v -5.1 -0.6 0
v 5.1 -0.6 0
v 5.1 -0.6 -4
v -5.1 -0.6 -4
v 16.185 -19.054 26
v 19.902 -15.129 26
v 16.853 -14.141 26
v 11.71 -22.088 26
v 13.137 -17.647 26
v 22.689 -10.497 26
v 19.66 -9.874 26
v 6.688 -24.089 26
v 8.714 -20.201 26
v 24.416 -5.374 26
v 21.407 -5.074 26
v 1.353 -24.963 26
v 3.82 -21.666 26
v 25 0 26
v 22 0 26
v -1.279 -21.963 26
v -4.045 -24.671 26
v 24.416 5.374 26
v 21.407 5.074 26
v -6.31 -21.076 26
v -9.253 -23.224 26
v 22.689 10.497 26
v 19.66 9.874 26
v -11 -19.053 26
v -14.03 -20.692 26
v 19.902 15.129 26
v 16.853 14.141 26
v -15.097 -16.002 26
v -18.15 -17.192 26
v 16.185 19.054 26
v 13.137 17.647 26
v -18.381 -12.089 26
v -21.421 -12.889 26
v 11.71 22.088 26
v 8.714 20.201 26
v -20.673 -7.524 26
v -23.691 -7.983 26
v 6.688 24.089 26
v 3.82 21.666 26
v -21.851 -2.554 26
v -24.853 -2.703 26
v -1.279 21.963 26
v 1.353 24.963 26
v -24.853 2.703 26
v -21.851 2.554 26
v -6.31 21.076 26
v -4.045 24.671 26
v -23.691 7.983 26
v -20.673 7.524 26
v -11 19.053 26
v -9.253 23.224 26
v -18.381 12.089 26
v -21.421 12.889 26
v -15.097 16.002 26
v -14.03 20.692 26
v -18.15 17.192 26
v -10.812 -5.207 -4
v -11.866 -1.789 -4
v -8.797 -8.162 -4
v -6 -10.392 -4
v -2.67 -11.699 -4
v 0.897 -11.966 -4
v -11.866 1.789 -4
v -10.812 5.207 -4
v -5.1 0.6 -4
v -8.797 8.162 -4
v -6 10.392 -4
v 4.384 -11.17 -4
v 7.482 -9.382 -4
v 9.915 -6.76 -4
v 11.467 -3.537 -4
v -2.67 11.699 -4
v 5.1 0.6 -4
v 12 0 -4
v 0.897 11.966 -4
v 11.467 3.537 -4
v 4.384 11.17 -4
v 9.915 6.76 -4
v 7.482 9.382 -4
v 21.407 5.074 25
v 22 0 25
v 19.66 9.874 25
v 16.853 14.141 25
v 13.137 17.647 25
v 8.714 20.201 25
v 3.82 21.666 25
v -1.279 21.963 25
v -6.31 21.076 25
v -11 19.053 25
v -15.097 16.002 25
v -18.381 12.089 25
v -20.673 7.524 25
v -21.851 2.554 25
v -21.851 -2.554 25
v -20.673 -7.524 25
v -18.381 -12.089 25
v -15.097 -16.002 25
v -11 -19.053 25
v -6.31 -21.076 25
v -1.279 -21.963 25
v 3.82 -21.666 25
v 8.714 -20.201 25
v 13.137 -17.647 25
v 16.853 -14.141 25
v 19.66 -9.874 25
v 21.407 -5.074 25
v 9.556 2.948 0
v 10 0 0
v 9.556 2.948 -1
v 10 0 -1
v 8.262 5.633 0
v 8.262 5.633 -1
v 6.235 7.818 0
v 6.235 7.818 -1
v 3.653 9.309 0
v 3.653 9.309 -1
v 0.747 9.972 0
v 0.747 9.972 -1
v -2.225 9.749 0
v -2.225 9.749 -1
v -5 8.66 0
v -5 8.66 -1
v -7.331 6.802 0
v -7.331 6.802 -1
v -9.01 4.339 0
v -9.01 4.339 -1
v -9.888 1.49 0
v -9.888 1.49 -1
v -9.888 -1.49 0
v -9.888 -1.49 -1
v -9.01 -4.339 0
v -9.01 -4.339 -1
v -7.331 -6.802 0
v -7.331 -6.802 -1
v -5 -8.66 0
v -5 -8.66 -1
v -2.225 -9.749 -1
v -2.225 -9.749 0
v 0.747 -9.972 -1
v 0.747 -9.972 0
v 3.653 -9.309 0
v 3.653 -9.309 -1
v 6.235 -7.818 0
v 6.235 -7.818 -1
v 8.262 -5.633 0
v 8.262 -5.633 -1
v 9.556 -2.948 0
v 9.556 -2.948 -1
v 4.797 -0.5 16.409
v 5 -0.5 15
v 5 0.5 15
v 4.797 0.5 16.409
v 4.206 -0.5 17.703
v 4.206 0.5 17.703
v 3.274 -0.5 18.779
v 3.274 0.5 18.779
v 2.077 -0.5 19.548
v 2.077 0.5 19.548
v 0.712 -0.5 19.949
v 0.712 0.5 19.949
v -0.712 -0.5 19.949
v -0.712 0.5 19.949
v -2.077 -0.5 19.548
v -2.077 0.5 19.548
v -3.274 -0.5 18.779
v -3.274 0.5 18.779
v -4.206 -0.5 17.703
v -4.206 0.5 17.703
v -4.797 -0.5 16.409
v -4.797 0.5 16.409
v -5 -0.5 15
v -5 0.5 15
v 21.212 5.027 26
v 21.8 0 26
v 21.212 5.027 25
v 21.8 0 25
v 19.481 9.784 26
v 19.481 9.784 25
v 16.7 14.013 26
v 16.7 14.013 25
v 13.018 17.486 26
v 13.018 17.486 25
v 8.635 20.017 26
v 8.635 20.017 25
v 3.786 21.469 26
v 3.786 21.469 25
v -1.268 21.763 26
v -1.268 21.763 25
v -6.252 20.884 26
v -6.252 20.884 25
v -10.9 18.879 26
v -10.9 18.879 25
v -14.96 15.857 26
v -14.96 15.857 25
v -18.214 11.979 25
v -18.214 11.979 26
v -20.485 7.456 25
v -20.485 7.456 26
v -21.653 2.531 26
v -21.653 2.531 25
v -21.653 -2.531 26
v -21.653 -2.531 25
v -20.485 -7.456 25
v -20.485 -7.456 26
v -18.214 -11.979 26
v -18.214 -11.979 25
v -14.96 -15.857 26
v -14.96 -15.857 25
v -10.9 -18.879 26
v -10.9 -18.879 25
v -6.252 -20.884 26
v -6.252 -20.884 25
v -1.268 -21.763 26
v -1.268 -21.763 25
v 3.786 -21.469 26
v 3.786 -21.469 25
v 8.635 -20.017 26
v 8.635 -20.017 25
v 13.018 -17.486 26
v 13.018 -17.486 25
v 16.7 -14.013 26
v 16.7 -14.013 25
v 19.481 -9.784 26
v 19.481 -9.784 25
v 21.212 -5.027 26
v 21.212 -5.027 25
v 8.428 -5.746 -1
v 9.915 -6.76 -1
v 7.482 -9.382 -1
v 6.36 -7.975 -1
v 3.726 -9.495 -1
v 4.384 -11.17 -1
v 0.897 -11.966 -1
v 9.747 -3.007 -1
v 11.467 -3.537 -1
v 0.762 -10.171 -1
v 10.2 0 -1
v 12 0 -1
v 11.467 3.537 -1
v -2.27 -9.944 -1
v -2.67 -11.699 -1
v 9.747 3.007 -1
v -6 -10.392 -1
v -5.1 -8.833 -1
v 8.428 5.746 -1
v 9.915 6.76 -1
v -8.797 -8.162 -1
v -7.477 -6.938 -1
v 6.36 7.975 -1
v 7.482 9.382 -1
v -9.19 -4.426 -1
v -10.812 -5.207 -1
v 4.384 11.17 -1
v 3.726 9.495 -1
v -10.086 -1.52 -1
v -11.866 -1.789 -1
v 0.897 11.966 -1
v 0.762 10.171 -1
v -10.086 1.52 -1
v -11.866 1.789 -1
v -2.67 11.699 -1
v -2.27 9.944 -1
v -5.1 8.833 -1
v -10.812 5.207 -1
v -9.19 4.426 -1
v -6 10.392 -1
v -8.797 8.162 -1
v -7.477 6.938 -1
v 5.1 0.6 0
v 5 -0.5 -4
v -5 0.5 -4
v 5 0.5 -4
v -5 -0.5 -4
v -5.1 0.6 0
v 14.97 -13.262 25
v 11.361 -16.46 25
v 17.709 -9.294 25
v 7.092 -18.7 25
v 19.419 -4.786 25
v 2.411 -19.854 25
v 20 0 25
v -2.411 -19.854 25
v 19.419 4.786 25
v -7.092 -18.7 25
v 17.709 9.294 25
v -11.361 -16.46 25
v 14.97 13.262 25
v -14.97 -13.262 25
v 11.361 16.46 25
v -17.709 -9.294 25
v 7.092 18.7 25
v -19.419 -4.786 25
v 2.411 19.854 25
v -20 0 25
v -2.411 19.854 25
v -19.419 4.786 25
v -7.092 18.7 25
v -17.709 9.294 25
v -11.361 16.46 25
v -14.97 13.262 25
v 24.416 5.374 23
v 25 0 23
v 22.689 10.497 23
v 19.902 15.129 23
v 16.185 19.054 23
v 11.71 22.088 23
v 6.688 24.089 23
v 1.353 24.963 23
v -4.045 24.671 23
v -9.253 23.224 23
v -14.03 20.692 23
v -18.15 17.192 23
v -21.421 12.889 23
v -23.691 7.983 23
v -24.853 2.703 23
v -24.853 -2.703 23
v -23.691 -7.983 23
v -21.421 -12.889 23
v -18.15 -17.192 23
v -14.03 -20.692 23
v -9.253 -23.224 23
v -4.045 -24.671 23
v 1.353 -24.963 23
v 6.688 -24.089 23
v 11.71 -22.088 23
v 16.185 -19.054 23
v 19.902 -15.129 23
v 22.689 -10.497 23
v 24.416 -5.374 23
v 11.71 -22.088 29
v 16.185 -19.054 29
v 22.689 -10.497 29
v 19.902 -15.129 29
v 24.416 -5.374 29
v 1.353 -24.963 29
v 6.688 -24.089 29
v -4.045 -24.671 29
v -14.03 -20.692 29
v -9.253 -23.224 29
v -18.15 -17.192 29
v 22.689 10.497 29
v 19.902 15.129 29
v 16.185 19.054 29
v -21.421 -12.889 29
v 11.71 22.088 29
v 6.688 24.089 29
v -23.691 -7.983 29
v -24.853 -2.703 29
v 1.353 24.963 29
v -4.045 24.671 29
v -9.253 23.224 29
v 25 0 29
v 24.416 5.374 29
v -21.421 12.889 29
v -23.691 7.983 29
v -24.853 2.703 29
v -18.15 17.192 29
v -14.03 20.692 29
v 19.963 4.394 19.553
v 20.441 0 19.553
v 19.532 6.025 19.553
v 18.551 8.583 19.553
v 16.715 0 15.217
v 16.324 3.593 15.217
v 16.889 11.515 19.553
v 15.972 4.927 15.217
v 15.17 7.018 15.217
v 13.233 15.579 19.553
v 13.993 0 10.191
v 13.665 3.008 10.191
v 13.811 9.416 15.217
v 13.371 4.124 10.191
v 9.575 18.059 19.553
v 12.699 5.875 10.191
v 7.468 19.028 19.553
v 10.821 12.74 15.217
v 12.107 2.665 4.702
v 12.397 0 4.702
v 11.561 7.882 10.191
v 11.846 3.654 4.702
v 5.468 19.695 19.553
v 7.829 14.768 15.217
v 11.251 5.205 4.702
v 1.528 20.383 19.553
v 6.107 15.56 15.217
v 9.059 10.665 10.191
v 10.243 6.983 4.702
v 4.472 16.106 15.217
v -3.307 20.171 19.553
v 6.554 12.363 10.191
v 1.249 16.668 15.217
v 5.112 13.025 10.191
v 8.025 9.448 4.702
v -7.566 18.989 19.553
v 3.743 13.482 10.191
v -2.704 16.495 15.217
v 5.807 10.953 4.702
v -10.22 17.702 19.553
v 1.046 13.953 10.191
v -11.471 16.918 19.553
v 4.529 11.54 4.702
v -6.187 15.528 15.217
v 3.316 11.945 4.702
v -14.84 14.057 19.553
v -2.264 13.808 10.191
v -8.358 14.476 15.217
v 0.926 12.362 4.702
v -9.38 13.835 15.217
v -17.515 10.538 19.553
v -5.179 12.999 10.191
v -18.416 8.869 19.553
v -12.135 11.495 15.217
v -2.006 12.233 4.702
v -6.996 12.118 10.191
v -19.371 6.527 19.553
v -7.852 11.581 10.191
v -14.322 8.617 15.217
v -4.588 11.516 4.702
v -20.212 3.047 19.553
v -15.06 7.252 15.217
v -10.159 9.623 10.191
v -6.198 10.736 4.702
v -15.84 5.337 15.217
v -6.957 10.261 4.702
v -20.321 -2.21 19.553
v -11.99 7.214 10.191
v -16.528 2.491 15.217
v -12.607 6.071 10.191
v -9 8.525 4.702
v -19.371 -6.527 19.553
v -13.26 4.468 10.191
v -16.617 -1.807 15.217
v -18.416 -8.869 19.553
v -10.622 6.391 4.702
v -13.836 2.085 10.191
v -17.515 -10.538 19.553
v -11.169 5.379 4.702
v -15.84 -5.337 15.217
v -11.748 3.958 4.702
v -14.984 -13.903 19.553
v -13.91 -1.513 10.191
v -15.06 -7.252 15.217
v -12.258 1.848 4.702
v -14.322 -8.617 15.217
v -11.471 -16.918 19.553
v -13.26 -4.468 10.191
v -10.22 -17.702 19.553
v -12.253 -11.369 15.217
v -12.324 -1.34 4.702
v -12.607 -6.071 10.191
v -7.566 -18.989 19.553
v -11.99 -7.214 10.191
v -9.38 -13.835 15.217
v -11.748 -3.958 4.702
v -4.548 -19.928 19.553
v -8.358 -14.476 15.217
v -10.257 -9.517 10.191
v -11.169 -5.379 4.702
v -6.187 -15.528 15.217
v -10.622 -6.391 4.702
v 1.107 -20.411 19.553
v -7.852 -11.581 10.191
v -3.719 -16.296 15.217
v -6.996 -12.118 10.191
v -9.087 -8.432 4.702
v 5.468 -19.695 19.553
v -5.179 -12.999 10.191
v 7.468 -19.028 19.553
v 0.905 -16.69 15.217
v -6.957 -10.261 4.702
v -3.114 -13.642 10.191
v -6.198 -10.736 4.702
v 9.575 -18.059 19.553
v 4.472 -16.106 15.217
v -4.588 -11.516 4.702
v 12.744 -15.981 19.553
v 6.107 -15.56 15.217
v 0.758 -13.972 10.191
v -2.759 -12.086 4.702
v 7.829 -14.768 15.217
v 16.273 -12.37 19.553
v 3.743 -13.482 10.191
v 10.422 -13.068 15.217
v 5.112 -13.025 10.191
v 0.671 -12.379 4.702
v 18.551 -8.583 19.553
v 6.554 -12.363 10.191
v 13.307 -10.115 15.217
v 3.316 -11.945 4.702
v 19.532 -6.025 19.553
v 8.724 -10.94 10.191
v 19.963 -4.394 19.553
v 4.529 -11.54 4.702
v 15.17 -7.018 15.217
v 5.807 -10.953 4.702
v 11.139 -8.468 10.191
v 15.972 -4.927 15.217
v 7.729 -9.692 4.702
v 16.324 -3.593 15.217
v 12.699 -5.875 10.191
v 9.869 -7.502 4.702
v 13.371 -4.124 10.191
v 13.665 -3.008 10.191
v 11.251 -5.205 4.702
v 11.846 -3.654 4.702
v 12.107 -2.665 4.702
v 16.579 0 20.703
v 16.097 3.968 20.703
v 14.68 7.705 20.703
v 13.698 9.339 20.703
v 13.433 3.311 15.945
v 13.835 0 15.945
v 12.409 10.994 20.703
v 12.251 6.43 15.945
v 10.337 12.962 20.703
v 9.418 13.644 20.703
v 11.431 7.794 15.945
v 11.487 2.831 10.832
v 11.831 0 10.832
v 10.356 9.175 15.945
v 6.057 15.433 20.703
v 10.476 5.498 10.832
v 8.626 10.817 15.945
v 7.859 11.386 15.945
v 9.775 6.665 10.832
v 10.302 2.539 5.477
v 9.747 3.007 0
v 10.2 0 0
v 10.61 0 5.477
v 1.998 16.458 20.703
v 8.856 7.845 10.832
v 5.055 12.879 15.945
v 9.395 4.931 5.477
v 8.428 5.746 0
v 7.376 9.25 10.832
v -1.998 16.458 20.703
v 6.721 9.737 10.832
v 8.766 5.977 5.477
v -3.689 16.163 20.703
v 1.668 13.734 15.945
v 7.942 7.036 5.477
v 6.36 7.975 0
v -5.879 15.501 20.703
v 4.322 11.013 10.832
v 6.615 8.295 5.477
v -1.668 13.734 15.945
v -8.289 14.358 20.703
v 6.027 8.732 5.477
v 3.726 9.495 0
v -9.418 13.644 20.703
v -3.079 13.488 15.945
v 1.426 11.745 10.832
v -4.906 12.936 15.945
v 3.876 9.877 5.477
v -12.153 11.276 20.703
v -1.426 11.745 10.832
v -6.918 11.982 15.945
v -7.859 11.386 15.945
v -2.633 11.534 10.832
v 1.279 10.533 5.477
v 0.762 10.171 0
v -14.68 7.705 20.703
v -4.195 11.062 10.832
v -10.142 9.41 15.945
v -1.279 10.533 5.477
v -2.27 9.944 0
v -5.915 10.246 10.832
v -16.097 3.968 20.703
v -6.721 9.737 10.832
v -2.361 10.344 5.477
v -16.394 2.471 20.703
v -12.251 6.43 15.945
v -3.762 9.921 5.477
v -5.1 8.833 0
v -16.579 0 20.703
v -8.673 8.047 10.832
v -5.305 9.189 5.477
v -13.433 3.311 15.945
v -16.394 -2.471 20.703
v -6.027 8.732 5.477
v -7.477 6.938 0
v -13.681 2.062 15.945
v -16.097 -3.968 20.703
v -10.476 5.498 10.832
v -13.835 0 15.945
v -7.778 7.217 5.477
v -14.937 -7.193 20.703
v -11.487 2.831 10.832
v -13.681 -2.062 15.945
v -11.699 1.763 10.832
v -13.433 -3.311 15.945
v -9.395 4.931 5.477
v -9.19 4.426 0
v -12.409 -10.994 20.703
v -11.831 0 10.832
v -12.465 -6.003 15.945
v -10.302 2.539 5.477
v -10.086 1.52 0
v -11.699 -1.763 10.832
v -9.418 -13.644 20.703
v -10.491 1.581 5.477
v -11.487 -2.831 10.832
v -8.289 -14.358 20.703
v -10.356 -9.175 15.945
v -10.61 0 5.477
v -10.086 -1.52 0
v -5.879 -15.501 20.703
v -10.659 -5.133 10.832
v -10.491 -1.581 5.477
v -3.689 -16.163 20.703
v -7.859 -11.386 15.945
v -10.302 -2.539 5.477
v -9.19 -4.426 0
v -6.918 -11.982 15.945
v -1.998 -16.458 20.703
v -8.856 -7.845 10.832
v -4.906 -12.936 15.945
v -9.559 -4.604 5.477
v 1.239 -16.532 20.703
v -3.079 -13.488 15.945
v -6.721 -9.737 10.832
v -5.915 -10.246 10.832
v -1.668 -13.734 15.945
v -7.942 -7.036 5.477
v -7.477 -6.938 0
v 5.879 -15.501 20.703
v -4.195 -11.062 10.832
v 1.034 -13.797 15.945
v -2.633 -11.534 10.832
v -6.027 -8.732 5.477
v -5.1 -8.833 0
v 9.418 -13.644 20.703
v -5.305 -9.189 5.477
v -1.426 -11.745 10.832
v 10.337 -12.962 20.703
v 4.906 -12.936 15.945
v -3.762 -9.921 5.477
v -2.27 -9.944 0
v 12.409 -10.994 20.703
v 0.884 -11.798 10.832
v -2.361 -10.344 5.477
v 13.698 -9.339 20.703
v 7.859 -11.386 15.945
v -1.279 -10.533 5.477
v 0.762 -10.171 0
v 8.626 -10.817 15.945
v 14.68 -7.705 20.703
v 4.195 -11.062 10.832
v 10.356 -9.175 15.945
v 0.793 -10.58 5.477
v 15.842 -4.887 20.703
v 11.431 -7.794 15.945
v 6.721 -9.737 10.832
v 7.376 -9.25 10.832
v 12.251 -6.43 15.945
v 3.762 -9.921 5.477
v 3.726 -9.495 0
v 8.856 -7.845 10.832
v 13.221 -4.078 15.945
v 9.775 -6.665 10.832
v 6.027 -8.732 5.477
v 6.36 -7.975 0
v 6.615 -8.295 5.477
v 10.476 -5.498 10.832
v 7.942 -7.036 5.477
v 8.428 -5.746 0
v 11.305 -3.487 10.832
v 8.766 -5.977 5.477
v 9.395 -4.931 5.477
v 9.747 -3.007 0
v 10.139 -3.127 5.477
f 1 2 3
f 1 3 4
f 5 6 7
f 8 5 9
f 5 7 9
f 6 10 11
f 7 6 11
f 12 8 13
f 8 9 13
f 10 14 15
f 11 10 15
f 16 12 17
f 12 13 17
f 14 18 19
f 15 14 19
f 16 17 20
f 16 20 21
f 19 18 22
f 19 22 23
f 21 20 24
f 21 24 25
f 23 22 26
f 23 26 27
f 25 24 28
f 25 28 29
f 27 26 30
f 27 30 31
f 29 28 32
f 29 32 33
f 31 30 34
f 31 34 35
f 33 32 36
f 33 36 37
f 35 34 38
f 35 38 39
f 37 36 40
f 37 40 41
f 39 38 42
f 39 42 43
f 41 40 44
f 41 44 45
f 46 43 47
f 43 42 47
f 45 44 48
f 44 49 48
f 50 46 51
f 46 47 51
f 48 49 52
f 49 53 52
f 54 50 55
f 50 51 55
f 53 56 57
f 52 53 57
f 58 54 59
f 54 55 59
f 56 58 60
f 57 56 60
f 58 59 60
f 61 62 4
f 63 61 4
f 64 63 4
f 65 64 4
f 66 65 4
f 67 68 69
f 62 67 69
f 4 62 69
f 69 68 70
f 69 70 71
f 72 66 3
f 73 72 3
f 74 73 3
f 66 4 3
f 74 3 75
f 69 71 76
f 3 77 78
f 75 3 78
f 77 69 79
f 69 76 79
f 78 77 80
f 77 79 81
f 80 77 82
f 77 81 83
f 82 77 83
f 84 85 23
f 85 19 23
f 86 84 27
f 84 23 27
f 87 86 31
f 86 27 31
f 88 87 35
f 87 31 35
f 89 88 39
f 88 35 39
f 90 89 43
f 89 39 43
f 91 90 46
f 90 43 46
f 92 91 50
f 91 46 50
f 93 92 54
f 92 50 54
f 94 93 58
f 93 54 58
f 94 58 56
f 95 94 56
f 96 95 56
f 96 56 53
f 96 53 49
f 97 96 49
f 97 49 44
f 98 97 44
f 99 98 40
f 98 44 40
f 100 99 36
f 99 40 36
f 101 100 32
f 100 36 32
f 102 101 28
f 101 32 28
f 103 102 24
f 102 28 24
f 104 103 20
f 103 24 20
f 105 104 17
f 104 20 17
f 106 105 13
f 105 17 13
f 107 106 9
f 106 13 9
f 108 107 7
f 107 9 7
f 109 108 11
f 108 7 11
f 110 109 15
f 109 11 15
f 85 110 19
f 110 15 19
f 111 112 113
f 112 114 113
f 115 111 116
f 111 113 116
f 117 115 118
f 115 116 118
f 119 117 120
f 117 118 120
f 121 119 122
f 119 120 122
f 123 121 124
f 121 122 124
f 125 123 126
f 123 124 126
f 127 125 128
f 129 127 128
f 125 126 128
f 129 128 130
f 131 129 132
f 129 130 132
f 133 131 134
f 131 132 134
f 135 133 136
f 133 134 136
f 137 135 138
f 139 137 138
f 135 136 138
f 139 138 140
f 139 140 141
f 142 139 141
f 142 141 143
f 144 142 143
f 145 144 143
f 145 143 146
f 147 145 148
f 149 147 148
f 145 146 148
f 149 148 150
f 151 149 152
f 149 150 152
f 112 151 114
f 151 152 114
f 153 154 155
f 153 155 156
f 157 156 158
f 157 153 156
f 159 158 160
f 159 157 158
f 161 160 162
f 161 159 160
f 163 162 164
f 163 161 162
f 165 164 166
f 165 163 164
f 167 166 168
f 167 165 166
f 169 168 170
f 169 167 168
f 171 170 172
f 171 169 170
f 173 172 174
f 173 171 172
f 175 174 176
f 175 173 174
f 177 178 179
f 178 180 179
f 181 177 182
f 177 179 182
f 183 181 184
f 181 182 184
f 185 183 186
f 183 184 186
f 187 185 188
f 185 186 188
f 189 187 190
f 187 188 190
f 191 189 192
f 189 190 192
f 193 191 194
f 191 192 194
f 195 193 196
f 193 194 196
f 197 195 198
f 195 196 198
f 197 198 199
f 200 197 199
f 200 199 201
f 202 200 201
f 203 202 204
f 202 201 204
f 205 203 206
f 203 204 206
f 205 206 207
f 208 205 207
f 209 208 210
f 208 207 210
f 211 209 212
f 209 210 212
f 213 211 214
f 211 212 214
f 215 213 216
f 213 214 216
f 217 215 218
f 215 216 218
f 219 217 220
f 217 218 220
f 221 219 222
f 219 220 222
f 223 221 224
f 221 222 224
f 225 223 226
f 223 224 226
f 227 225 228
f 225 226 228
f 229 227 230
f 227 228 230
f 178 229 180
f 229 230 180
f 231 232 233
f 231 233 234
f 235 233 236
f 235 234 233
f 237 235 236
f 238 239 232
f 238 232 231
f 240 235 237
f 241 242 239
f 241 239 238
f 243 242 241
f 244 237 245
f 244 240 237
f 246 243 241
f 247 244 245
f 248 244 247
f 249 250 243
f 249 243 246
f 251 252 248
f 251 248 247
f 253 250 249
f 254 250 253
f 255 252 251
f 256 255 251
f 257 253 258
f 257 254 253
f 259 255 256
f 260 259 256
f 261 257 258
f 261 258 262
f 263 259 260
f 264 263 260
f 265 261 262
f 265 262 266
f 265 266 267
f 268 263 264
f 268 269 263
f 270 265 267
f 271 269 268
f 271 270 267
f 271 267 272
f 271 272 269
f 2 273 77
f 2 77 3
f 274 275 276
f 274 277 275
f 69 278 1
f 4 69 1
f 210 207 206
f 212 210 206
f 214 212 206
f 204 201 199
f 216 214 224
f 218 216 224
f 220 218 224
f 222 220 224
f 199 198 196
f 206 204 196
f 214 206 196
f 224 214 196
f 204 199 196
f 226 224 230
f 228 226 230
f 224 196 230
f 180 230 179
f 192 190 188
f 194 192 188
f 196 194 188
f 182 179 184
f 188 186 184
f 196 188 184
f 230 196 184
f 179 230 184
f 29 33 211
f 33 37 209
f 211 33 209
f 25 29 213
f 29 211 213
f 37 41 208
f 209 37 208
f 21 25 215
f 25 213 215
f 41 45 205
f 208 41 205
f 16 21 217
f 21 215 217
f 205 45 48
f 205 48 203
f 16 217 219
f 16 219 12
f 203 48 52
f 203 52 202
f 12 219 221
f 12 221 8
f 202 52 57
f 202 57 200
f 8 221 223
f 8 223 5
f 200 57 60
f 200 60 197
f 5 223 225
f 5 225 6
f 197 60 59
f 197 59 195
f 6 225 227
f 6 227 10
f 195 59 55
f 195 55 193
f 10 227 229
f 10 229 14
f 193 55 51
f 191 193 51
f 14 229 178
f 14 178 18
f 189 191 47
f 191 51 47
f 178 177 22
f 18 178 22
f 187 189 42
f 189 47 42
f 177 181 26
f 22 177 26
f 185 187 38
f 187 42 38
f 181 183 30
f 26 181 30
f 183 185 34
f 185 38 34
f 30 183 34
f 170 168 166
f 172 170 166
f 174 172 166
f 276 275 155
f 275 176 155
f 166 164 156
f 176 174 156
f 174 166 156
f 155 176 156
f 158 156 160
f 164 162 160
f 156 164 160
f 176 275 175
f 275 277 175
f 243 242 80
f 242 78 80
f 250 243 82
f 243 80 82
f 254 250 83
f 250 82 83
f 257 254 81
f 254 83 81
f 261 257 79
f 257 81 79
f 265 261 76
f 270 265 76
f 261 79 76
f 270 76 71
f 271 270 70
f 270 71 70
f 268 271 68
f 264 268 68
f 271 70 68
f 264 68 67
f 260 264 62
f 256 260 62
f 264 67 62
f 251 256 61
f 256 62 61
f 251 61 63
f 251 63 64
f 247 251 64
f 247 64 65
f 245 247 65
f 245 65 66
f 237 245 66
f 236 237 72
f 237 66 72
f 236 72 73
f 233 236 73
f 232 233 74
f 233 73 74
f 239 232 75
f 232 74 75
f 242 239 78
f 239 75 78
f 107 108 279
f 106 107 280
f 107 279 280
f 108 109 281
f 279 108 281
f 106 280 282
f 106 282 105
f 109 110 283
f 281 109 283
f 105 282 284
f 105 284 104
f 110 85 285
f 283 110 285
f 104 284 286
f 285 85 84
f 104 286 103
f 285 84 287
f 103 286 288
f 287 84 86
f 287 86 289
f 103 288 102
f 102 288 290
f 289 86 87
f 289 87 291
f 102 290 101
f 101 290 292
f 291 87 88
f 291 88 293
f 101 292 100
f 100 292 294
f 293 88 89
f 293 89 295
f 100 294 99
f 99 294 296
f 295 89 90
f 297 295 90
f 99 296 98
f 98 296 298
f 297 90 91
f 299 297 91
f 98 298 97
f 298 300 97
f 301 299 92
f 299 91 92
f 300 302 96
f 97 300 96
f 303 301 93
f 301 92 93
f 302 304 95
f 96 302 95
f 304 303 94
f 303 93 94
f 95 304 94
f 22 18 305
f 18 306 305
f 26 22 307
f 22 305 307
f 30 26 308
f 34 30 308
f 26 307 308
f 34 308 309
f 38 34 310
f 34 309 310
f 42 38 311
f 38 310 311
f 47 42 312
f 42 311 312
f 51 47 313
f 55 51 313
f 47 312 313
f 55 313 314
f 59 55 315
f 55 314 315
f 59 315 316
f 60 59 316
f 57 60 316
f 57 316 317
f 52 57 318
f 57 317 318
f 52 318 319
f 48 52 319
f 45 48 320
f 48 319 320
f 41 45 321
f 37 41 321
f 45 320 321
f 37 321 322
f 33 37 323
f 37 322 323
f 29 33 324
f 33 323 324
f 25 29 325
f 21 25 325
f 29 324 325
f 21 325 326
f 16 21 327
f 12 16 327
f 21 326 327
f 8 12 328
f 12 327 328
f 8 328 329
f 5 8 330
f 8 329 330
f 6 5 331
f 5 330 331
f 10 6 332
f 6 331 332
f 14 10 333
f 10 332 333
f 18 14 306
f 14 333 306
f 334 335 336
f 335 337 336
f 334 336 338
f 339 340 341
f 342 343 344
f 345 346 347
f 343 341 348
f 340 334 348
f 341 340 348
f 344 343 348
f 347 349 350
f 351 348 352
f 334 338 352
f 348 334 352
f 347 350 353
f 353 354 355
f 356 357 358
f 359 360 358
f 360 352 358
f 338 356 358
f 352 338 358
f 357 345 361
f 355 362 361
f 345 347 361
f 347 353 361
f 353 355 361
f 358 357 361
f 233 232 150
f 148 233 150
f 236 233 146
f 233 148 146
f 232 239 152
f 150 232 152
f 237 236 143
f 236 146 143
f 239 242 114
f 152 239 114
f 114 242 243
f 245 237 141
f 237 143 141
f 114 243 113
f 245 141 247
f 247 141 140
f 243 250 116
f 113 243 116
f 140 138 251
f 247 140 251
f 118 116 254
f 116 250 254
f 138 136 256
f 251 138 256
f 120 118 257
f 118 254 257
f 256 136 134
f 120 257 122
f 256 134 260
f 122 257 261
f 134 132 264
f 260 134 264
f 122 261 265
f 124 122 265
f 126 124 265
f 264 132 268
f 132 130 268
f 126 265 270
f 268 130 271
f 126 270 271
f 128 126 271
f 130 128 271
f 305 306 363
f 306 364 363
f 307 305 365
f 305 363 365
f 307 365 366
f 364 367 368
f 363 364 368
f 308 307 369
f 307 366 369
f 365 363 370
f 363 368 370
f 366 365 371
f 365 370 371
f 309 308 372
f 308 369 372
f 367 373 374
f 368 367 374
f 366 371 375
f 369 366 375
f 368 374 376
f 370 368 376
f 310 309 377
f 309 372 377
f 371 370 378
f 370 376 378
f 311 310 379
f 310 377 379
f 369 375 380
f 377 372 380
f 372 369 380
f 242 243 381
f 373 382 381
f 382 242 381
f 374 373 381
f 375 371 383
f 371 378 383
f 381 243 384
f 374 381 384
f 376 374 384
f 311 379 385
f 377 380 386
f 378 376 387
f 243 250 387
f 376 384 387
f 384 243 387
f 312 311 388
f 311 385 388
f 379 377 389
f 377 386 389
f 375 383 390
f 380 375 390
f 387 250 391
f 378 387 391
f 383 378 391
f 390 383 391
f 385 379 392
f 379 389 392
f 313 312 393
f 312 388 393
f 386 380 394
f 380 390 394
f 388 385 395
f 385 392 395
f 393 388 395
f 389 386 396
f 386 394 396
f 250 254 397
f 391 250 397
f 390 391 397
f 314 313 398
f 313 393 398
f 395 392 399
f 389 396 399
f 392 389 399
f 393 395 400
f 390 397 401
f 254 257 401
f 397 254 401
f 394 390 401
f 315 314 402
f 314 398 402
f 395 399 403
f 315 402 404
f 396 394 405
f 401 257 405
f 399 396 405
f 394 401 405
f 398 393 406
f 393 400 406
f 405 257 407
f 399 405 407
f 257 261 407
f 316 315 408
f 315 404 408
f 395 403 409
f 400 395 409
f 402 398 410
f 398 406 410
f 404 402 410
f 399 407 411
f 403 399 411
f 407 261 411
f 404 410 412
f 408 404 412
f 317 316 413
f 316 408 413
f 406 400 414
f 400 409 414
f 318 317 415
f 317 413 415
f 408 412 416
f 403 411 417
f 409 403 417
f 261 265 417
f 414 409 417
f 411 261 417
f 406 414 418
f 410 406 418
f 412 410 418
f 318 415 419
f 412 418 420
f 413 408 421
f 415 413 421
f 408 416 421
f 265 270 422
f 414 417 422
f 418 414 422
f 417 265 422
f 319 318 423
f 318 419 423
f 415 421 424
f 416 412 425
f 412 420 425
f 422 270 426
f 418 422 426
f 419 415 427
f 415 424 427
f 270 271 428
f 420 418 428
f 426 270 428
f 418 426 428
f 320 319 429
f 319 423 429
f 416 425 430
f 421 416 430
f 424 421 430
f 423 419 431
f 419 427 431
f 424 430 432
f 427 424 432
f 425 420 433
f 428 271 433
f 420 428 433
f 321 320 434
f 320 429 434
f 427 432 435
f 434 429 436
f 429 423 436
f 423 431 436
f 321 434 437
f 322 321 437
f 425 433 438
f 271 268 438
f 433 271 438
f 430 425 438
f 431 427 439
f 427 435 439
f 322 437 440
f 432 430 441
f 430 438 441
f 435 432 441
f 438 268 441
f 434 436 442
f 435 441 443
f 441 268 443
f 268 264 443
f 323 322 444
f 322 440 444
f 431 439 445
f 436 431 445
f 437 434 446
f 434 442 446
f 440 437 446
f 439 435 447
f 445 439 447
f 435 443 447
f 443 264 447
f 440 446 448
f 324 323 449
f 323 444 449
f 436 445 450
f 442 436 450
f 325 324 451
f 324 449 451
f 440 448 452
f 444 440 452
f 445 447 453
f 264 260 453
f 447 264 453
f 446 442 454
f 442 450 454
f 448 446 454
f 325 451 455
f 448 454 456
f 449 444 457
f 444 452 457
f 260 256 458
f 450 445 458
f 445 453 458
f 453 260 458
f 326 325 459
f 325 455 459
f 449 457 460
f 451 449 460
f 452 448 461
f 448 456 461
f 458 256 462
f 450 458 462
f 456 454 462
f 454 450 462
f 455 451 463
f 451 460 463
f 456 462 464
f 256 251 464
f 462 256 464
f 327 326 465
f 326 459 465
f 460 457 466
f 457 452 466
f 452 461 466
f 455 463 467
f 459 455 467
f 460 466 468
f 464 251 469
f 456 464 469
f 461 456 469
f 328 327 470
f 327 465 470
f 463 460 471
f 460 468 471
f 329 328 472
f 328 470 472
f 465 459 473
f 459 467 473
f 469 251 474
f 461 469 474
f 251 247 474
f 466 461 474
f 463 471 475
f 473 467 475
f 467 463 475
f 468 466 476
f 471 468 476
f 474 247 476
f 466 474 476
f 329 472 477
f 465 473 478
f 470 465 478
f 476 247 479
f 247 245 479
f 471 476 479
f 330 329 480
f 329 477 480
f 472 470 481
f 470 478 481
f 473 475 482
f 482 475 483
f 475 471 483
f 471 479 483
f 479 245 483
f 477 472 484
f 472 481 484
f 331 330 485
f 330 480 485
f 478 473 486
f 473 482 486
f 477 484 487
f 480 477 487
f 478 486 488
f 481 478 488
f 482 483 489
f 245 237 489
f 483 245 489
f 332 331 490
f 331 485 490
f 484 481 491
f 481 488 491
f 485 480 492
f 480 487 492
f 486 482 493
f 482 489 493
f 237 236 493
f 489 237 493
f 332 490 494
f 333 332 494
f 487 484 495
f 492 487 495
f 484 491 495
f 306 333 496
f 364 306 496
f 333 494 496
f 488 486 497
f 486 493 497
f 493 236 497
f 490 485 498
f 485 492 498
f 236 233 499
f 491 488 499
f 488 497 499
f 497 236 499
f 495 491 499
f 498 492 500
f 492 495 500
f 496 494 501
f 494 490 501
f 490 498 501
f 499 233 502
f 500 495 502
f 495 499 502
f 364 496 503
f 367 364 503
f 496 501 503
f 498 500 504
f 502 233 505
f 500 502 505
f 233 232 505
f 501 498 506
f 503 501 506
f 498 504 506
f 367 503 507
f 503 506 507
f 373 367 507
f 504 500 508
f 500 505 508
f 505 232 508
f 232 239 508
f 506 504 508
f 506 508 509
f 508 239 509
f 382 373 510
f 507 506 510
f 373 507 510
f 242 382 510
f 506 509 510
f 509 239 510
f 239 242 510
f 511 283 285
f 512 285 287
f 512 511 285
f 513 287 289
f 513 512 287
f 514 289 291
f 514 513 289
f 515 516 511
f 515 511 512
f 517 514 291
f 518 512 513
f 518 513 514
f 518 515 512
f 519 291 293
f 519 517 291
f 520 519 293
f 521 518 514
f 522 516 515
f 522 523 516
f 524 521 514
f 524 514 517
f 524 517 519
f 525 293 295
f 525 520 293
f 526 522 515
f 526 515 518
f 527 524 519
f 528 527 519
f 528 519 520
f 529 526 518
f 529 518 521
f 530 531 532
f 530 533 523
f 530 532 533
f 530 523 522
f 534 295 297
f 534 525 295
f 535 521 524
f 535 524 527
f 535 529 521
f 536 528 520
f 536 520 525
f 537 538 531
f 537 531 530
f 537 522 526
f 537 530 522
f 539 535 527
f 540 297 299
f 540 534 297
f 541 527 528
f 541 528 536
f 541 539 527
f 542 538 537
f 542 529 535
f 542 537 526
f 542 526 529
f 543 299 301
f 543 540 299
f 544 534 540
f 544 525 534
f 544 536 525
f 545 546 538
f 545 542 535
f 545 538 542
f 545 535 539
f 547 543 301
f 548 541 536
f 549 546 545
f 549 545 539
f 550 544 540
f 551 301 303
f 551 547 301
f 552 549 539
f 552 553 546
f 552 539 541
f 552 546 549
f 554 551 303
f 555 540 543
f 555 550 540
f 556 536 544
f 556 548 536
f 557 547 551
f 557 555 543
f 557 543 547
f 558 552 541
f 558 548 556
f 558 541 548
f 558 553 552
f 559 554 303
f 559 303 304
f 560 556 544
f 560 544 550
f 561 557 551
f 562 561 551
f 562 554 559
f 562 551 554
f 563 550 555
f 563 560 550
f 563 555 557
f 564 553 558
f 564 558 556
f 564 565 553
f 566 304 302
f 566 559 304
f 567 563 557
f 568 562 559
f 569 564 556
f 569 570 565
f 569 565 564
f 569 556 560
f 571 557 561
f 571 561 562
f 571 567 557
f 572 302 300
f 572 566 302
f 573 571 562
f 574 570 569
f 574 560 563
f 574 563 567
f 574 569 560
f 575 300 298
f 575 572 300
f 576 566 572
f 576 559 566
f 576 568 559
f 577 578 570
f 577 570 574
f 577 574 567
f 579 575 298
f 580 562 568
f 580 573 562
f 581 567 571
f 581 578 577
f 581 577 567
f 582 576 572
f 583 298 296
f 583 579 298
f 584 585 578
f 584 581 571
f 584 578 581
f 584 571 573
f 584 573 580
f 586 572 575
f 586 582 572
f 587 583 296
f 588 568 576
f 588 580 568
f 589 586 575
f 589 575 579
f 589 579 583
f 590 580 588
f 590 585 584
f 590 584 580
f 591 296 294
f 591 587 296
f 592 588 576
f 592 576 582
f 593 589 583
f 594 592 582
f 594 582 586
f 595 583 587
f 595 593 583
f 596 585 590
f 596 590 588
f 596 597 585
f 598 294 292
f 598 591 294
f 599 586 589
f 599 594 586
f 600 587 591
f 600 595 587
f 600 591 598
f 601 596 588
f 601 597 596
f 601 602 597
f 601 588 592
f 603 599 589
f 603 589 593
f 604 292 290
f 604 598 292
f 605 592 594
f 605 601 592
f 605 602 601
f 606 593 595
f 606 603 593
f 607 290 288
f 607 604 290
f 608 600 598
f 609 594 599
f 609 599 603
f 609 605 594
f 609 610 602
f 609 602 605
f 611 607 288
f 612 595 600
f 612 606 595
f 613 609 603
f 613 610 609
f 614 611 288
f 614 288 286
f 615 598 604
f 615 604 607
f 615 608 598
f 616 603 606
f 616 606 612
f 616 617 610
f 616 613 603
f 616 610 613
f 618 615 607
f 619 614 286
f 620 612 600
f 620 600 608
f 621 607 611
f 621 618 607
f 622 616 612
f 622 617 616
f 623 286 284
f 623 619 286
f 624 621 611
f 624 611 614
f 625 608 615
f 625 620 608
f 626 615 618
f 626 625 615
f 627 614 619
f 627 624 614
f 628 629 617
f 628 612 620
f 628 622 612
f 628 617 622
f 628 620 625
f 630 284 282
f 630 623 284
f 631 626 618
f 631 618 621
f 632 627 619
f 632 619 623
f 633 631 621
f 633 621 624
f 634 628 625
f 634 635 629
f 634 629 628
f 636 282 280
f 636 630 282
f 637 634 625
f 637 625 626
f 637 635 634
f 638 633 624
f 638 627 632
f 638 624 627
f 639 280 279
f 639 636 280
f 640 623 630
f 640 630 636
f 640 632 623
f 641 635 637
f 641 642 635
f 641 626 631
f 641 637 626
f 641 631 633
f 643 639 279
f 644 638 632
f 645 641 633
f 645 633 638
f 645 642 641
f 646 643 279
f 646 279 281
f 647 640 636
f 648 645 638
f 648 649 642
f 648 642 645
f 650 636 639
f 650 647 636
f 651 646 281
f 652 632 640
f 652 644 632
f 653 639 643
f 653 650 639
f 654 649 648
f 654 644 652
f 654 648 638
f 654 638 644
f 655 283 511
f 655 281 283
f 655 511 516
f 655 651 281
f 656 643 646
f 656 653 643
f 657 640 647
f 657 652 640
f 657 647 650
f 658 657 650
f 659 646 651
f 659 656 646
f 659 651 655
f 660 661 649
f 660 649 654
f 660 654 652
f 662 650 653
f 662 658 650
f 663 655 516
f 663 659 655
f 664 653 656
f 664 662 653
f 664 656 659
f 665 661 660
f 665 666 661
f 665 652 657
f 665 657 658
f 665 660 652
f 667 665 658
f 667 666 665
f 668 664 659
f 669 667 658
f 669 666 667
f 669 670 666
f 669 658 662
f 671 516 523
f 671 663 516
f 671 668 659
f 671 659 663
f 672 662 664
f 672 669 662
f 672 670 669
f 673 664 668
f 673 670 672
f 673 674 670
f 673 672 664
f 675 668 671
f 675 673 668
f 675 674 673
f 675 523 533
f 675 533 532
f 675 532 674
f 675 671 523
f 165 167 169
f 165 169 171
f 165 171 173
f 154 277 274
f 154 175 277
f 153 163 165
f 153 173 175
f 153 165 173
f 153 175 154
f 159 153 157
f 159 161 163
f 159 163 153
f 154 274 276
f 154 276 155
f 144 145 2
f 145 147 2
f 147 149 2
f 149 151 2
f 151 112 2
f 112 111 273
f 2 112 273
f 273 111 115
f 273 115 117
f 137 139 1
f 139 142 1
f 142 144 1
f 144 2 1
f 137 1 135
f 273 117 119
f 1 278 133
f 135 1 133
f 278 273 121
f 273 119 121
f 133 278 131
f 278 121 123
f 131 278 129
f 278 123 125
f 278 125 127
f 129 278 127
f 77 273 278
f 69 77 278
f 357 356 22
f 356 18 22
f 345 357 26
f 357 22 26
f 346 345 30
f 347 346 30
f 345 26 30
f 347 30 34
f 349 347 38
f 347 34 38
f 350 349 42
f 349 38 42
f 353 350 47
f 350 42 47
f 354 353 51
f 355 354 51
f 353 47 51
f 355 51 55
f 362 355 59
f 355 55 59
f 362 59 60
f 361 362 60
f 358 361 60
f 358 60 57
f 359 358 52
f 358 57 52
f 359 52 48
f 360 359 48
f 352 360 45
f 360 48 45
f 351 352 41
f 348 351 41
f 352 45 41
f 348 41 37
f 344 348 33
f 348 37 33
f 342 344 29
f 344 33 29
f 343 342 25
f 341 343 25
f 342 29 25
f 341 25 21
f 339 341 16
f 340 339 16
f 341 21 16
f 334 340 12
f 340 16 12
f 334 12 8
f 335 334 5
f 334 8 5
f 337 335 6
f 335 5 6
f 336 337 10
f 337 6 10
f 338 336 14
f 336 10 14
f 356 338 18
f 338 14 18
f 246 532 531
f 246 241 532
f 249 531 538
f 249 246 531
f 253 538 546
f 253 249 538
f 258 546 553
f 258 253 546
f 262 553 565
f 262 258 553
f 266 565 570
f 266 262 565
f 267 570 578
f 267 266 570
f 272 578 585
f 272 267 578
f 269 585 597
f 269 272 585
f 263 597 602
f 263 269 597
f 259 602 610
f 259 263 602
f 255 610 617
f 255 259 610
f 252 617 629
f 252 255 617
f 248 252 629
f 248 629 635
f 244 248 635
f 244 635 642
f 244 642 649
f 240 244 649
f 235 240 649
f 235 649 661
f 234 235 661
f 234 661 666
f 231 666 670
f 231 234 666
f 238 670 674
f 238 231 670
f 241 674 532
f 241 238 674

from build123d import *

# Parameters (mm, degrees)
SKETCH001_W  = 10.2
SKETCH001_H  = 1.2
POCKET_DEPTH = 5
PAD_DEPTH    = 0.5


with BuildPart() as body:
    # Sketch → Revolution (revolve)
    with BuildSketch(Plane.XZ):
        Polygon((0, 0), (10, 0), (10, -1), (12, -1), (12, -4), (0, -4), align=None)
    revolve(axis=Axis((0, 0, 0), (0, 0, 1)))

    # Sketch001 (on Face1 of Revolution) → Pocket (cut)
    with BuildSketch(Plane(origin=(0, 0, 0), x_dir=(-1, 0, 0), z_dir=(0, 0, 1))):
        Rectangle(SKETCH001_W, SKETCH001_H)
    extrude(amount=-POCKET_DEPTH, mode=Mode.SUBTRACT)


with BuildPart() as body001:
    # Sketch002 → Revolution001 (revolve)
    with BuildSketch(Plane.XZ):
        with BuildLine():
            Line((10.2, 0), (10.2, -1))
            Line((10.2, -1), (12, -1))
            ThreePointArc((25, 23), (15.21951, 12.776932), (12, -1))
            Line((25, 26), (25, 23))
            Line((22, 26), (25, 26))
            Line((22, 25), (22, 26))
            Line((20, 25), (22, 25))
            ThreePointArc((20, 25), (12.737515, 13.426094), (10.2, 0))
        make_face()
    revolve(axis=Axis((0, 0, 0), (0, 0, 1)))


with BuildPart() as body002:
    # Sketch003 → Revolution002 (revolve)
    with BuildSketch(Plane.XZ):
        Polygon((21.8, 25), (0, 25), (0, 29), (25, 29), (25, 26), (21.8, 26), align=None)
    revolve(axis=Axis((0, 0, 0), (0, 0, 1)))


with BuildPart() as body003:
    # Sketch004 → Pad (new body, symmetric)
    with BuildSketch(Plane.XZ):
        with BuildLine():
            Line((-5, -4), (5, -4))
            Line((5, -4), (5, 15))
            ThreePointArc((5, 15), (0, 20), (-5, 15))
            Line((-5, -4), (-5, 15))
        make_face()
    extrude(amount=PAD_DEPTH, both=True)


solid = Compound([body.part, body001.part, body002.part, body003.part])
